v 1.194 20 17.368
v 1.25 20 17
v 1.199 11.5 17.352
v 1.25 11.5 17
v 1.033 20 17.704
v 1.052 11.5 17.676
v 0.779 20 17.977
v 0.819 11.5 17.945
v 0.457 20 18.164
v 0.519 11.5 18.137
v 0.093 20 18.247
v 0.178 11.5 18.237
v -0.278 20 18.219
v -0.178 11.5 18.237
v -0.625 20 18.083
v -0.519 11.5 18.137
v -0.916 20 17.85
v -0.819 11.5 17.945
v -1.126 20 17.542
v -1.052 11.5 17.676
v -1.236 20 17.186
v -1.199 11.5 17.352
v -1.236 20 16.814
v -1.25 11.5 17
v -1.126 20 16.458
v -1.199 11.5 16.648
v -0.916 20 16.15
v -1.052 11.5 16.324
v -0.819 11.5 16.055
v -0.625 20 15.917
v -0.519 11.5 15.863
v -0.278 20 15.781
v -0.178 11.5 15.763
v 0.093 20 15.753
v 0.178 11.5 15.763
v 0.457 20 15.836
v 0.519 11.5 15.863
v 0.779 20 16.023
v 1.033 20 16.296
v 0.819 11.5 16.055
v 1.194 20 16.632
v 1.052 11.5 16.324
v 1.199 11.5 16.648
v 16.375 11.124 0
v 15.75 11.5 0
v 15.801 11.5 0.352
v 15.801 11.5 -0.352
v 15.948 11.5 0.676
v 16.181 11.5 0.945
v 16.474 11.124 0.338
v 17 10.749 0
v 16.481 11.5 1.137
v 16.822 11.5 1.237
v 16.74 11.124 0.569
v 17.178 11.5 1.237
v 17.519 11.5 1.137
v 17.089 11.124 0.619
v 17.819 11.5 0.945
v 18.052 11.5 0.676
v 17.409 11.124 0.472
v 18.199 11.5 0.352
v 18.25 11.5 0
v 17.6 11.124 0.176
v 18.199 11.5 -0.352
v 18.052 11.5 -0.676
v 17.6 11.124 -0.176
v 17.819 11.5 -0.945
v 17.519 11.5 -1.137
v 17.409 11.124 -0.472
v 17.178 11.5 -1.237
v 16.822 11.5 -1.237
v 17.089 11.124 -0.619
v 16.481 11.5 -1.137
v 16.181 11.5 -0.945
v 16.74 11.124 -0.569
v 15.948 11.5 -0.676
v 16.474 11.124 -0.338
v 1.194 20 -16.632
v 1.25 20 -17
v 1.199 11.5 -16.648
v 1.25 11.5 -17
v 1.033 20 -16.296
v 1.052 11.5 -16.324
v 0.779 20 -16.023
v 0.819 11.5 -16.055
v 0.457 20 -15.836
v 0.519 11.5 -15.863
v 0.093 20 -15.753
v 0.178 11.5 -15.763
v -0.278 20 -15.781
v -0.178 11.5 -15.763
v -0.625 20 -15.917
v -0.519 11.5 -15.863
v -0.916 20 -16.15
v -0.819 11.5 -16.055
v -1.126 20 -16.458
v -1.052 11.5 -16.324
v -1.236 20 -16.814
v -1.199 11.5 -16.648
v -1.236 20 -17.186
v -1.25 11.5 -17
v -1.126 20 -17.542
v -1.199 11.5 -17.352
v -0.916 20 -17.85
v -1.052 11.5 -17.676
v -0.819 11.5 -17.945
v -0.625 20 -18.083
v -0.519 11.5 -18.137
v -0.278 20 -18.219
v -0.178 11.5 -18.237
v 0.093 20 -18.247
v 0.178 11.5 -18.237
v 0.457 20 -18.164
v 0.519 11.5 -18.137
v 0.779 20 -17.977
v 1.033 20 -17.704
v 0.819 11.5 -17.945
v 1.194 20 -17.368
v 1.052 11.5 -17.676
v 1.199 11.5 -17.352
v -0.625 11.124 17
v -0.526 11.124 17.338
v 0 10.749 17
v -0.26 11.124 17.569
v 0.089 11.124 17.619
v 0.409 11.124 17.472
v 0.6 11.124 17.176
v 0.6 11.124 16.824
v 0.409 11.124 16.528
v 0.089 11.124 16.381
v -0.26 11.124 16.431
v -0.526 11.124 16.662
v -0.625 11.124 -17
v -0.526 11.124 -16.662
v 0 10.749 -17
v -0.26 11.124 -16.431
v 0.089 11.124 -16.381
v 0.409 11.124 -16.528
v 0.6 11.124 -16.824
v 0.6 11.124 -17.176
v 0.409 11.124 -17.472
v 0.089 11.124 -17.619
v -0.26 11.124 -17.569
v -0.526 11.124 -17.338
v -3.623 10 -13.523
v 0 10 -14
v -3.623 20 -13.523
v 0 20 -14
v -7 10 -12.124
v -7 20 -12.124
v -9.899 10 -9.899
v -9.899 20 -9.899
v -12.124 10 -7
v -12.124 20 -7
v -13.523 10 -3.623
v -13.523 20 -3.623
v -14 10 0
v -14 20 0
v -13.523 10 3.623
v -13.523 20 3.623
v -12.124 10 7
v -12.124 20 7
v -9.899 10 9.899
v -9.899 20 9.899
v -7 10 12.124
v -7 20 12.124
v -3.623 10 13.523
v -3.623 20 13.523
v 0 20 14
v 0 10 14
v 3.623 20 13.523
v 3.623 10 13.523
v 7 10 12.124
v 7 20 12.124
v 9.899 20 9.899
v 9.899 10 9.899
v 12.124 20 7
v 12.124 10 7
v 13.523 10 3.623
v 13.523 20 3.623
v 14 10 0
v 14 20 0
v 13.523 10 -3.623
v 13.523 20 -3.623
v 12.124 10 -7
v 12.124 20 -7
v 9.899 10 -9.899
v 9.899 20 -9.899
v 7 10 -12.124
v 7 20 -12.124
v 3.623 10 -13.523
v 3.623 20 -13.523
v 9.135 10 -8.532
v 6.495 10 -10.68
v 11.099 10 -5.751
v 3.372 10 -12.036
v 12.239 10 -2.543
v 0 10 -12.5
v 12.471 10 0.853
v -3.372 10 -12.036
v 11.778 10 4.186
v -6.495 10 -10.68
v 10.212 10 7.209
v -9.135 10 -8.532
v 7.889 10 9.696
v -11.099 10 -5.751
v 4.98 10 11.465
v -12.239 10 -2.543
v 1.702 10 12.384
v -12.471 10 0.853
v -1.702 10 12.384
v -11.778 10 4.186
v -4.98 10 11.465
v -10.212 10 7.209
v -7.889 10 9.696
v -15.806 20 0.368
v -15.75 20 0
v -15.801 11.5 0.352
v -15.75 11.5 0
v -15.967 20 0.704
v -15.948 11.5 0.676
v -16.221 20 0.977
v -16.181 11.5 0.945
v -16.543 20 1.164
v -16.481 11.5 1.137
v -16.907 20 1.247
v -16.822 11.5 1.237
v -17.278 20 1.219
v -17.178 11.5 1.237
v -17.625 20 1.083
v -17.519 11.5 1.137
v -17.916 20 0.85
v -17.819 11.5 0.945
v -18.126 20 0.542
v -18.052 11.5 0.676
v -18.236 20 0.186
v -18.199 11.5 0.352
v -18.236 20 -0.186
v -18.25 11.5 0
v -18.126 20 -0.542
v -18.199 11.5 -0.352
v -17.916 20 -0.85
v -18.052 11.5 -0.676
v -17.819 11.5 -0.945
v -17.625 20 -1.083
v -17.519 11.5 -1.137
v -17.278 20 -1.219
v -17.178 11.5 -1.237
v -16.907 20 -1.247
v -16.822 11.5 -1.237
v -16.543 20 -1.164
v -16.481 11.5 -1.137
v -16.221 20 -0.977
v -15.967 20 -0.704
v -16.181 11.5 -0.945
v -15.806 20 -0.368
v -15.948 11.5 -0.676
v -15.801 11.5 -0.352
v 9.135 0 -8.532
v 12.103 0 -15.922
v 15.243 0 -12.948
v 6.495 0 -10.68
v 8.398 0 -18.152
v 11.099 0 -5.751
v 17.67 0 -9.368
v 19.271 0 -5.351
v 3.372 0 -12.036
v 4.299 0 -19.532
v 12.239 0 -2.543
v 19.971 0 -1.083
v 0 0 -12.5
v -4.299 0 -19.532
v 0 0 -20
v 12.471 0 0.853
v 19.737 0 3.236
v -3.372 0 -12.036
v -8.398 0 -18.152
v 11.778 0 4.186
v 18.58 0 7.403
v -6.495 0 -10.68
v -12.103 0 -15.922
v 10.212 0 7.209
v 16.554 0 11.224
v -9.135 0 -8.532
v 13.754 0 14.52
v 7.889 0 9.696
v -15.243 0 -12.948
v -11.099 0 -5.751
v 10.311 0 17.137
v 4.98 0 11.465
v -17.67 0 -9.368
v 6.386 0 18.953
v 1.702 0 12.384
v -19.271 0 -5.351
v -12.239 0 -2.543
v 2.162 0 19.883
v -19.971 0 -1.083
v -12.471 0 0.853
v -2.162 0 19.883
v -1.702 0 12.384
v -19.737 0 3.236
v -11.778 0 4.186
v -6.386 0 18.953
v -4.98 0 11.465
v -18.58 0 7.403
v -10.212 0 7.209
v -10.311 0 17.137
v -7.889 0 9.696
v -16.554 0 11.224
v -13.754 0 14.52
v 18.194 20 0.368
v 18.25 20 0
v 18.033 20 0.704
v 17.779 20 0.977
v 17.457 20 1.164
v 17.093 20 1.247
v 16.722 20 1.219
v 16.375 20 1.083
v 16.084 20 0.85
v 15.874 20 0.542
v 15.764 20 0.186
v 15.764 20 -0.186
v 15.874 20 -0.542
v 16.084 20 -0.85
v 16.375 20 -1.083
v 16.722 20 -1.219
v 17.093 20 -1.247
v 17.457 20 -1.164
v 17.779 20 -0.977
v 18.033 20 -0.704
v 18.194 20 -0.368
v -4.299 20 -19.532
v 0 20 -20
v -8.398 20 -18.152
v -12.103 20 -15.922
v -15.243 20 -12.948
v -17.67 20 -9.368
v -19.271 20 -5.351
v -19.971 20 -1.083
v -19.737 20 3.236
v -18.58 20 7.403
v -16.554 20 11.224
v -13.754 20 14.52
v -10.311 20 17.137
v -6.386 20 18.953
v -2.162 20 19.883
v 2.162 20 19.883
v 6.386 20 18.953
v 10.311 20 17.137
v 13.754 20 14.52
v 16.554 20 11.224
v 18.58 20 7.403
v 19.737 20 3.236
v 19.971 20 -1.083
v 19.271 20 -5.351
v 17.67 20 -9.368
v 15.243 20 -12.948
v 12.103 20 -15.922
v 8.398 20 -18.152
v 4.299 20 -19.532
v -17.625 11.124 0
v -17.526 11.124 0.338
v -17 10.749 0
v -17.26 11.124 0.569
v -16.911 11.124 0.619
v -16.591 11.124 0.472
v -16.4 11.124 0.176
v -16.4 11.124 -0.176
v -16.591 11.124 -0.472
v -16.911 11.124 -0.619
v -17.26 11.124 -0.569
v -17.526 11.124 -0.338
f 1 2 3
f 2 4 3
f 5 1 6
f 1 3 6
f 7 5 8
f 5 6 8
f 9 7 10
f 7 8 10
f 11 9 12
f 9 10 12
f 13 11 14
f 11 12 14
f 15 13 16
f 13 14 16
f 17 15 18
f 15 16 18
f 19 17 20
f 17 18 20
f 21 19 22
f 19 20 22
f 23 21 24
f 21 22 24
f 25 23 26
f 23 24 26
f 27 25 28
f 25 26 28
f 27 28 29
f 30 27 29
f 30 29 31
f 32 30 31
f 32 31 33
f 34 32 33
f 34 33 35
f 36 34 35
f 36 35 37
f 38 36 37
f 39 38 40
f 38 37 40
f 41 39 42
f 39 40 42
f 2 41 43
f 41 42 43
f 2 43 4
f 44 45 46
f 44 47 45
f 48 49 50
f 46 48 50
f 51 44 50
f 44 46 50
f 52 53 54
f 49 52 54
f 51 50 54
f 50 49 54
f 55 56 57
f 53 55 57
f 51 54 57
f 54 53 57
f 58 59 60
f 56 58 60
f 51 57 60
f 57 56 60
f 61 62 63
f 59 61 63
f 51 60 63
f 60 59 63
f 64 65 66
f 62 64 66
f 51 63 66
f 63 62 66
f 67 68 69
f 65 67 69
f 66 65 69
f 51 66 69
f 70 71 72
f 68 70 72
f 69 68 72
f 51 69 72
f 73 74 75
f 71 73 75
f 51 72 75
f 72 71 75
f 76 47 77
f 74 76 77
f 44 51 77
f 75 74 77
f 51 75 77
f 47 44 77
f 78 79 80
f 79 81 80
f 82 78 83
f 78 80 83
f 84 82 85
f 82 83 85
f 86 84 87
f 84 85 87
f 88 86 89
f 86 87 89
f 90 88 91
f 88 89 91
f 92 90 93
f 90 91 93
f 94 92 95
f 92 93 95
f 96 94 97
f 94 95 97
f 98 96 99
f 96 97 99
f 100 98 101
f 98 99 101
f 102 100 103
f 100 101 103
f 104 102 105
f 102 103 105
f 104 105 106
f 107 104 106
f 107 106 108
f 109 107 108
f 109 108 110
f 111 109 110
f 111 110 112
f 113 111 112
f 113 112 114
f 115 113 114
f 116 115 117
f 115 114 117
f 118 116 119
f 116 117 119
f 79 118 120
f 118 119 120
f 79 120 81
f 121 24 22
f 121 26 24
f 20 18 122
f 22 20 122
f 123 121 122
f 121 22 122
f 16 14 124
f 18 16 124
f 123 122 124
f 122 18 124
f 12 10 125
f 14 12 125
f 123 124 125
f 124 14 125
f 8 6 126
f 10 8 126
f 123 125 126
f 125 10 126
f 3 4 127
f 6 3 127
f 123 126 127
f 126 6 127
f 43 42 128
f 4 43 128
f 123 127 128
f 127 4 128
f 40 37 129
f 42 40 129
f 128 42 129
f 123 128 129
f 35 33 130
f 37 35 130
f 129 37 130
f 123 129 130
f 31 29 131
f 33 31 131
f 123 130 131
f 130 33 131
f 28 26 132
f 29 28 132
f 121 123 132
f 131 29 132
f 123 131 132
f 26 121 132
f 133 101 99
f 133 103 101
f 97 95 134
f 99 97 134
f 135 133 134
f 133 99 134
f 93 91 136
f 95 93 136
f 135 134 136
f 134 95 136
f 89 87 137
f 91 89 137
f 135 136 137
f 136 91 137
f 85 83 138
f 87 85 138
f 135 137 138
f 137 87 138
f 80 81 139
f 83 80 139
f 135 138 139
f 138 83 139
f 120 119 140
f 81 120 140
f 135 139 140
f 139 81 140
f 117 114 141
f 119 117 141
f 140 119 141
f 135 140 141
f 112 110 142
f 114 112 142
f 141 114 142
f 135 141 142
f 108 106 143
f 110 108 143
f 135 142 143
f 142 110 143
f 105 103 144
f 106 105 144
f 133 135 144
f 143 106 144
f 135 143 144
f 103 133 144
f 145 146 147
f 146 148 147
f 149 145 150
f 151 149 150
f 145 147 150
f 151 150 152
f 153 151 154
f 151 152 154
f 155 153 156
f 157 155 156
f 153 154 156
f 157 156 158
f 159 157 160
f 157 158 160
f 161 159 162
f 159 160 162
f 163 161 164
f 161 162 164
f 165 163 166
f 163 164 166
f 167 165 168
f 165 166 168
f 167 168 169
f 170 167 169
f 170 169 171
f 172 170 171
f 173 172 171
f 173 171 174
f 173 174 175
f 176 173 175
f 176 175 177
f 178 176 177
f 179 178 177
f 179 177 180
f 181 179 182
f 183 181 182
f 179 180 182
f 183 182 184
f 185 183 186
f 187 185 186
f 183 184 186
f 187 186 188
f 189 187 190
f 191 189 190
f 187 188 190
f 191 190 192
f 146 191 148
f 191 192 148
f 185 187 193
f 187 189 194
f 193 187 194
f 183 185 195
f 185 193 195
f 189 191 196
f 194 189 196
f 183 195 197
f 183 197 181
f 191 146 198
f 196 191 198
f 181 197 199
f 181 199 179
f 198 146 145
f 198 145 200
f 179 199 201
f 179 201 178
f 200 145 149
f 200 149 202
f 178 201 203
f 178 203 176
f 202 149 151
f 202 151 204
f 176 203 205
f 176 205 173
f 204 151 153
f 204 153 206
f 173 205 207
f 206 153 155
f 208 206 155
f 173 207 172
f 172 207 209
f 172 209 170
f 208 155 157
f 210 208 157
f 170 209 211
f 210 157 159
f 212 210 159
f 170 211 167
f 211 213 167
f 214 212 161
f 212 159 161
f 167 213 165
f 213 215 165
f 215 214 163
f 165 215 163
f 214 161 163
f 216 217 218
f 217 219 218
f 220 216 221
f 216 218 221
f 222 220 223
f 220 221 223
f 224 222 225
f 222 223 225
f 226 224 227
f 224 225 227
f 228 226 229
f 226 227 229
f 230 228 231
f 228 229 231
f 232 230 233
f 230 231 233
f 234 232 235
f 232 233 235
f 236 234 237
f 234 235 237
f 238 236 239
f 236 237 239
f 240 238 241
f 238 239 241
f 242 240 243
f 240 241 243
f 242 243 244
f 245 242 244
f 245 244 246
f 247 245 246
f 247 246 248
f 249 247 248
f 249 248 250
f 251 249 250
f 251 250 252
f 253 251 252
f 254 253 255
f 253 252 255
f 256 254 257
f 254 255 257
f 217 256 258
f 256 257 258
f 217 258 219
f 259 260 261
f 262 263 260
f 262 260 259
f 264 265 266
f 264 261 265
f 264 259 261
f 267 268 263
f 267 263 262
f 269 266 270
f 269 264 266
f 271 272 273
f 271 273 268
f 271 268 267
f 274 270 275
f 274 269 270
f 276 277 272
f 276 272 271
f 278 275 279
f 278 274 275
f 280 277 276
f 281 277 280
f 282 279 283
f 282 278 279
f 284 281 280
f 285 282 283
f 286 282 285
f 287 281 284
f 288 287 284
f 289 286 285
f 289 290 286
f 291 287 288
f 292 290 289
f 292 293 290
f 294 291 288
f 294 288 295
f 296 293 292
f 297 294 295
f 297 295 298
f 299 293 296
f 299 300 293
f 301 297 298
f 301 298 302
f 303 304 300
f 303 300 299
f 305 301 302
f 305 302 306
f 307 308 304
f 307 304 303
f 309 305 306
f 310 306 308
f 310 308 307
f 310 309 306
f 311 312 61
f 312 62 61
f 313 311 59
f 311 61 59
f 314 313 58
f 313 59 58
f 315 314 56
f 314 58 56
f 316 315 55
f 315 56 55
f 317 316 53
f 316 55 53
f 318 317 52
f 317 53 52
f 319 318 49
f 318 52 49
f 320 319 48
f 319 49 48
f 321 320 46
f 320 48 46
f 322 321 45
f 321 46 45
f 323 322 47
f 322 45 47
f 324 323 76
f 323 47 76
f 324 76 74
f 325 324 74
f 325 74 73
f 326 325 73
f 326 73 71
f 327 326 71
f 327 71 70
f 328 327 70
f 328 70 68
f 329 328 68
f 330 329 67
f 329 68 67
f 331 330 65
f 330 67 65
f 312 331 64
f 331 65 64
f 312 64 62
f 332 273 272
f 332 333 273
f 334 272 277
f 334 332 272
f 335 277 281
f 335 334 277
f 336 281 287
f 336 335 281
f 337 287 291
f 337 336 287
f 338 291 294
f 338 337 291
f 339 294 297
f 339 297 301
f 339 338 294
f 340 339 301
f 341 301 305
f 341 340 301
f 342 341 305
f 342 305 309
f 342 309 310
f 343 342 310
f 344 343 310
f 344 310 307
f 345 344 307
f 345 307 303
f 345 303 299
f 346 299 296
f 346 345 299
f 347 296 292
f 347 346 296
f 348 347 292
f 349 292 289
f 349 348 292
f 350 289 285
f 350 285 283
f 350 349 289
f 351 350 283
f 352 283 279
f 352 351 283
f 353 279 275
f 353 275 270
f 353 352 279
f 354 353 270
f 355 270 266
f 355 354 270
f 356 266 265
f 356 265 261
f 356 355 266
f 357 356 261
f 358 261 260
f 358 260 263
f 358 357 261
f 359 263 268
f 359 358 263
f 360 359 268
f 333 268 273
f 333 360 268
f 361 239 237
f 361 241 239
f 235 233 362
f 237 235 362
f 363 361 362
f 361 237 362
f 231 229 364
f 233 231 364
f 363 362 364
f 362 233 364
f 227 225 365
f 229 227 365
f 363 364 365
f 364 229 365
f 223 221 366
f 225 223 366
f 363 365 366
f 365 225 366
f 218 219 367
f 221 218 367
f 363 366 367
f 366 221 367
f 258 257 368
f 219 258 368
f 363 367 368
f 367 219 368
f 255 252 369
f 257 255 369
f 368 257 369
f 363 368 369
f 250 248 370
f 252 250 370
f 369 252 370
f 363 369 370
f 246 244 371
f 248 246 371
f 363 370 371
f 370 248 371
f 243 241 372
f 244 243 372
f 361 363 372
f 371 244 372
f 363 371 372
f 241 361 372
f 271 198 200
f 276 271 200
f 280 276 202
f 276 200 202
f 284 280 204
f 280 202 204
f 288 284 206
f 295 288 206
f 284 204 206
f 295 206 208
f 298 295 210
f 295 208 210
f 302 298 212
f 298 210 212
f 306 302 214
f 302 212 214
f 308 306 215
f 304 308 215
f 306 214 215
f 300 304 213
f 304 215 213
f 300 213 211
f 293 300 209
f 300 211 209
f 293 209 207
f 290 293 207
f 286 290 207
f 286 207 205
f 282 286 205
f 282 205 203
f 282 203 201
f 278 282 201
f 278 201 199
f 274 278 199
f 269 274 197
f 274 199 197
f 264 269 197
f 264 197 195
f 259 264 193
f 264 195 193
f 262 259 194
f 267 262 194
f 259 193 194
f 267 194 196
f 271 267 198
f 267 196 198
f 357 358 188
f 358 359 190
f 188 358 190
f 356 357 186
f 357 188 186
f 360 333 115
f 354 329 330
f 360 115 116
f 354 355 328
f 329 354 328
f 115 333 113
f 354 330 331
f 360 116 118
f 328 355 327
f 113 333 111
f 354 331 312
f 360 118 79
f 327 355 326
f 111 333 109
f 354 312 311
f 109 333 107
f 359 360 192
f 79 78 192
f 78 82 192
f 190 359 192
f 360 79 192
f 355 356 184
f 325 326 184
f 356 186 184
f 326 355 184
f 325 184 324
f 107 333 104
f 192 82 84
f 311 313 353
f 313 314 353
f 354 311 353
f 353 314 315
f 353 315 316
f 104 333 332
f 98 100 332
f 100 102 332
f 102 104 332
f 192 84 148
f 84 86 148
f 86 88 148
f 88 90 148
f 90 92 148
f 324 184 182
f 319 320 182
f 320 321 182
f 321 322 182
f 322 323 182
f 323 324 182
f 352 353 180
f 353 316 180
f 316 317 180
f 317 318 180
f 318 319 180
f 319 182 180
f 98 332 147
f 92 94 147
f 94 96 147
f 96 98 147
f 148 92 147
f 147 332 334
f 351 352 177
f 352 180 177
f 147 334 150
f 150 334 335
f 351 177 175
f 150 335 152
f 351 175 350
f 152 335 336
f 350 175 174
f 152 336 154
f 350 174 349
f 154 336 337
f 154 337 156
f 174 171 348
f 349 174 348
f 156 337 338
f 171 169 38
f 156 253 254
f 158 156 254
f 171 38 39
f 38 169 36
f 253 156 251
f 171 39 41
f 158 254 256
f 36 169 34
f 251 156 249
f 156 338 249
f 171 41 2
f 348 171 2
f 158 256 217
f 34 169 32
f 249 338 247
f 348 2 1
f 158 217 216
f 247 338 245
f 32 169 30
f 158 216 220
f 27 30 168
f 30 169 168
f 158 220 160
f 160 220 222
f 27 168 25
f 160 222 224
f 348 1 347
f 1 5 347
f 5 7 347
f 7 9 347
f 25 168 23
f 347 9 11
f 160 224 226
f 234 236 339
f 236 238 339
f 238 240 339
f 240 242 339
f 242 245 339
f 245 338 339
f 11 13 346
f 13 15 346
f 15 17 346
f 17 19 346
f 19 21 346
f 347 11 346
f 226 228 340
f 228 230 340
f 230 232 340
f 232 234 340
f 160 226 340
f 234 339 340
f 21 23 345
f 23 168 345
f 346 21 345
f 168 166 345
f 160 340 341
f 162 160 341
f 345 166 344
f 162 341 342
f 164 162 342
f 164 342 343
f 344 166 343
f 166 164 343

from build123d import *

# Parameters (mm, degrees)
SKETCH1_W                 = 7.5
SKETCH1_H                 = 20
SKETCH2_W                 = 1.5
SKETCH2_H                 = 10
M3X0_5_TAPPED_HOLE1_D     = 2.5
M3X0_5_TAPPED_HOLE1_DEPTH = 8.5
M3X0_5_TAPPED_HOLE1_TIP   = 0.751075774


with BuildPart() as part:
    # Sketch1 → Revolve1 (revolve)
    with BuildSketch(Plane.XY, mode=Mode.PRIVATE) as revolve1_sk:
        with Locations((16.25, 10)):
            Rectangle(SKETCH1_W, SKETCH1_H)
    revolve(revolve1_sk.sketch.rotate(Axis((0, -15.529138296, 0), (0, 1, 0)), 90), axis=Axis((0, -15.529138296, 0), (0, 1, 0)))

    # Sketch2 → Cut-Revolve1 (revolve, cut)
    with BuildSketch(Plane.XY, mode=Mode.PRIVATE) as cut_revolve1_sk:
        with Locations((13.25, 15)):
            Rectangle(SKETCH2_W, SKETCH2_H)
    revolve(cut_revolve1_sk.sketch.rotate(Axis((0, -1.547850983, 0), (0, 1, 0)), 90), axis=Axis((0, -1.547850983, 0), (0, 1, 0)), mode=Mode.SUBTRACT)

    # M3x0.5 Tapped Hole1
    with Locations(Plane(origin=(0, 20, 0), x_dir=(-1, 0, 0), z_dir=(0, 1, 0))):
        with Locations((17, 0), (-17, 0), (0, -17), (0, 17)):
            Hole(M3X0_5_TAPPED_HOLE1_D / 2, depth=M3X0_5_TAPPED_HOLE1_DEPTH)
            with Locations((0, 0, -(M3X0_5_TAPPED_HOLE1_DEPTH + M3X0_5_TAPPED_HOLE1_TIP / 2))):  # 118° drill point
                Cone(0, M3X0_5_TAPPED_HOLE1_D / 2, M3X0_5_TAPPED_HOLE1_TIP, mode=Mode.SUBTRACT)


solid = part.part
